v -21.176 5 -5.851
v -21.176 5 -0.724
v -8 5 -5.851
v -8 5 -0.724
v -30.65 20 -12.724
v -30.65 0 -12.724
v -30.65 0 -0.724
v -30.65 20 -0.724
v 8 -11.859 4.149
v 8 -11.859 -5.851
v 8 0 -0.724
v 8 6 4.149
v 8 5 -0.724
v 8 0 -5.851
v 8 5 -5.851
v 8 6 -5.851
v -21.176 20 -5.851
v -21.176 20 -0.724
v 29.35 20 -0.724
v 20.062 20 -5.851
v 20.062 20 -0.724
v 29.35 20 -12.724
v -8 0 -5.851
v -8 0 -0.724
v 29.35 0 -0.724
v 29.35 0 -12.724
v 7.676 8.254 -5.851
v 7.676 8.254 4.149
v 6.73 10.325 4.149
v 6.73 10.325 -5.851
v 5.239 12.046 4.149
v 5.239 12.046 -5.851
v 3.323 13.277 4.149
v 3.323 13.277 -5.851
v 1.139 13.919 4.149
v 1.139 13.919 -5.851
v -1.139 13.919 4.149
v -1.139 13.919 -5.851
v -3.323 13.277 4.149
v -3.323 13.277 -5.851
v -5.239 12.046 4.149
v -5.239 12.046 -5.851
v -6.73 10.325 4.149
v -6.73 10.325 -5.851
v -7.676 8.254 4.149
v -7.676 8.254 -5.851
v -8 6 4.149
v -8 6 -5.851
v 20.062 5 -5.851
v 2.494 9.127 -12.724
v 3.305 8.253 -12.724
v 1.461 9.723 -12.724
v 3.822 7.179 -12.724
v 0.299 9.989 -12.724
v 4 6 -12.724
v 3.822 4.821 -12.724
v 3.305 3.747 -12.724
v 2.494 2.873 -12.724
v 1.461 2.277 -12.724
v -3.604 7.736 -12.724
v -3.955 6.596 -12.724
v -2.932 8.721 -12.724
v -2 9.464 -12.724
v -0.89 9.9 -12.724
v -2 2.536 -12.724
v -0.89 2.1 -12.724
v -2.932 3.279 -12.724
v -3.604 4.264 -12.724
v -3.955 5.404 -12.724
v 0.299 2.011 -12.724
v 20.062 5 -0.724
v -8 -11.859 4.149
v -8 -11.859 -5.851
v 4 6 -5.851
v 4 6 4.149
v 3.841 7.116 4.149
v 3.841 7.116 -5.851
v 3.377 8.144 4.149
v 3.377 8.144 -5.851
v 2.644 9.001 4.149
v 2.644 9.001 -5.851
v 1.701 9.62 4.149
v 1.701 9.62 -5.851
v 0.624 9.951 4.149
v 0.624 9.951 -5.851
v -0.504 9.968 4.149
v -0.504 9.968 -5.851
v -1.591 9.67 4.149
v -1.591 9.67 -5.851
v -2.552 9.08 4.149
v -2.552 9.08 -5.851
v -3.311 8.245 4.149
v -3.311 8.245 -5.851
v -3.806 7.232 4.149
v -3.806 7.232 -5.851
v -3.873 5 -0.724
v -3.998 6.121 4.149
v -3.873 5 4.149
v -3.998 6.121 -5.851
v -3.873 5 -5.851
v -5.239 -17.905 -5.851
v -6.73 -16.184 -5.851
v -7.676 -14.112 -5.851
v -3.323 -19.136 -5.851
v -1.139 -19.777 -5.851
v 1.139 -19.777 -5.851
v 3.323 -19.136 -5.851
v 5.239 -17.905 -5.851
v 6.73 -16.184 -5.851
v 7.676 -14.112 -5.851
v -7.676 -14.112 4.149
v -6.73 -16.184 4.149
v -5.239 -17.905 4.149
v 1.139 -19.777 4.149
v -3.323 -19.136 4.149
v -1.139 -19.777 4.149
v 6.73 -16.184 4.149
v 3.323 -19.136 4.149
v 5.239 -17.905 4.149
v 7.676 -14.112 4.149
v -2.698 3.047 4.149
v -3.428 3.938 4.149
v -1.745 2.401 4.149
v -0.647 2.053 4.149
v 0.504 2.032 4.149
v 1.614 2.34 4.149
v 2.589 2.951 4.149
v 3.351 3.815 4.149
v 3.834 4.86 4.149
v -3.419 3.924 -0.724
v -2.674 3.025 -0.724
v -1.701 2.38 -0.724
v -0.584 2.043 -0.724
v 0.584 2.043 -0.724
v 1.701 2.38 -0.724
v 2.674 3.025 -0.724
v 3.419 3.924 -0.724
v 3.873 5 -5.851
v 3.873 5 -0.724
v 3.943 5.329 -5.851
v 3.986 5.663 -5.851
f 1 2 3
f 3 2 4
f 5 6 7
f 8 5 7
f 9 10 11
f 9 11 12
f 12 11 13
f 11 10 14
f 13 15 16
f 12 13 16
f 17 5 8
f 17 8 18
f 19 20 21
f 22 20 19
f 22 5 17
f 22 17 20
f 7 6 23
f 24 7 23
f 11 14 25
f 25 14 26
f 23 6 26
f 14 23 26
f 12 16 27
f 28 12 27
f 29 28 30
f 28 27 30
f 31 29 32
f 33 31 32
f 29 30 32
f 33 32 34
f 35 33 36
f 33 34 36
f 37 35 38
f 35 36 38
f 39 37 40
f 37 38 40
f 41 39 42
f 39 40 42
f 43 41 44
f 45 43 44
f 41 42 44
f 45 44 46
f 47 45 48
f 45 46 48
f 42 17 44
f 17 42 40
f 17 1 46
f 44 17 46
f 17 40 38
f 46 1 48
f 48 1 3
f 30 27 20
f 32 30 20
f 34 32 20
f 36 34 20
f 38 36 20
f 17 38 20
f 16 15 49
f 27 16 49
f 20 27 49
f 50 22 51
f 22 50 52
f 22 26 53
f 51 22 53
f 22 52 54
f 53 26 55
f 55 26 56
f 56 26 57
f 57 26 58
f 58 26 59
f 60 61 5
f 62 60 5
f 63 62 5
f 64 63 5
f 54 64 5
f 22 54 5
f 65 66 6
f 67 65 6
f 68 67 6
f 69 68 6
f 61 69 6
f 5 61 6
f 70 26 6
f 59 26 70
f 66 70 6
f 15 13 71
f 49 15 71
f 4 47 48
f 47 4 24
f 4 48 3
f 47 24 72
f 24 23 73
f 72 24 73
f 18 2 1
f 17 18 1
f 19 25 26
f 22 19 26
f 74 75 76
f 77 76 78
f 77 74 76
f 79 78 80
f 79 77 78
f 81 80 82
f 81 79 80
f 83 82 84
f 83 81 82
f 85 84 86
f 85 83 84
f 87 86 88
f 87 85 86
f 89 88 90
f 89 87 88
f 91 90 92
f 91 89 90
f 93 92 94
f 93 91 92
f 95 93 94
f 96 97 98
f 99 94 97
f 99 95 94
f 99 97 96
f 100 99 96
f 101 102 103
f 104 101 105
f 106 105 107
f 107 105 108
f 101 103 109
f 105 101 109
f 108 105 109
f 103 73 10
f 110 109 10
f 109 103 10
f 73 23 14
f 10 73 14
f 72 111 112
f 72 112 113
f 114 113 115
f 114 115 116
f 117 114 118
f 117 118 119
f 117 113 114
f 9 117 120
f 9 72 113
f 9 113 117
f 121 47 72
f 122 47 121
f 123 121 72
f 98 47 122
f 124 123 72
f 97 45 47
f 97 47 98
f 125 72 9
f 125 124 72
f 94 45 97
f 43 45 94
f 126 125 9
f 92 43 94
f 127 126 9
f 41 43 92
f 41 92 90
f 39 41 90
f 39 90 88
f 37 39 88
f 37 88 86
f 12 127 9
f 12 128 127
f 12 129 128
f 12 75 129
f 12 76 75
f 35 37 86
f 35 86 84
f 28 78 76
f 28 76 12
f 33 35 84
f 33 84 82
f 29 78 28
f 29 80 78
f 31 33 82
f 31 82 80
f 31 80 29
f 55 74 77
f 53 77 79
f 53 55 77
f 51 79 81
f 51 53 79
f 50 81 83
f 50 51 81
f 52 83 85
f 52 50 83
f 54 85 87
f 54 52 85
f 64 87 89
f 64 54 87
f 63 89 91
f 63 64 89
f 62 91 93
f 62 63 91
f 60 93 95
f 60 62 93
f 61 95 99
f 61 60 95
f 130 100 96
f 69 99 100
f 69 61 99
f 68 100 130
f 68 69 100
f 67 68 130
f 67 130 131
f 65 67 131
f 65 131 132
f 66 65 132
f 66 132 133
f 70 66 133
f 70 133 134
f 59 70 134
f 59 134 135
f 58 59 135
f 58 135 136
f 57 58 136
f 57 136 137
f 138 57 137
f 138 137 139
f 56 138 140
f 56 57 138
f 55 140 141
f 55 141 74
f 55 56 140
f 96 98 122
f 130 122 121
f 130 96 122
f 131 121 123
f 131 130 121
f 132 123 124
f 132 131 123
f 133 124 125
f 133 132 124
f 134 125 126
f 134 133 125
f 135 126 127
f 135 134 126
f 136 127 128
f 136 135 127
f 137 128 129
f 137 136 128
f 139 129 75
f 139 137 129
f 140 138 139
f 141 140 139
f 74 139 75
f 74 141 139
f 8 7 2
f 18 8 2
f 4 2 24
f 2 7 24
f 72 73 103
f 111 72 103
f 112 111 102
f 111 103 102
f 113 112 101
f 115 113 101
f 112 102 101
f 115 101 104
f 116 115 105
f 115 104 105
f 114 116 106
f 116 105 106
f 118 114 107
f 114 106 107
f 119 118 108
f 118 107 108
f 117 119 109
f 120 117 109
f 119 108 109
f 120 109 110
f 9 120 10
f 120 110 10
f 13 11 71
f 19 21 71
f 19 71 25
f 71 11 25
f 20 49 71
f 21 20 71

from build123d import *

# Parameters (mm, degrees)
BOSS_EXTRUDE1_DEPTH     = 20
SKETCH2_W               = 60
SKETCH2_H               = 12
BOSS_EXTRUDE2_DEPTH     = 5
SKETCH3_R               = 4
BOSS_EXTRUDE3_DEPTH     = 10
CUT_EXTRUDE1_DEPTH      = 38.939846984
CUT_EXTRUDE1_DEPTH_BACK = 38.939846984
SKETCH3_3_R             = 4


with BuildPart() as part:
    # Sketch1 → Boss-Extrude1 (new body)
    with BuildSketch(Plane(origin=(0, 0, 0), x_dir=(1, 0, 0), z_dir=(0, 1, 0))):
        Polygon((20.061919505, 0.724458204), (29.349845201, 0.724458204), (29.349845201, 12.724458204), (-30.650154799, 12.724458204), (-30.650154799, 0.724458204), (-21.176470588, 0.724458204), (-21.176470588, 5.851393189), (20.061919505, 5.851393189), align=None)
    extrude(amount=BOSS_EXTRUDE1_DEPTH)

    # Sketch2 → Boss-Extrude2 (add)
    with BuildSketch(Plane.XZ):
        with Locations((-0.650154799, -6.724458204)):
            Rectangle(SKETCH2_W, SKETCH2_H)
    extrude(amount=-BOSS_EXTRUDE2_DEPTH)

    # Sketch3 → Boss-Extrude3 (add)
    with BuildSketch(Plane.XY.offset(-5.851393189)):
        with BuildLine():
            Line((8, -11.858632677), (8, 6))
            ThreePointArc((8, 6), (0, 14), (-8, 6))
            Line((-8, 6), (-8, -11.858632677))
            ThreePointArc((-8, -11.858632677), (0, -19.858632677), (8, -11.858632677))
        make_face()
        with Locations((0, 6)):
            Circle(SKETCH3_R, mode=Mode.SUBTRACT)
    extrude(amount=BOSS_EXTRUDE3_DEPTH)

    # Sketch3<3> → Cut-Extrude1 (cut, two sides: drawn at the far end of the back side and taken through both)
    with BuildSketch(Plane.XY.offset(-5.851393189).offset(-CUT_EXTRUDE1_DEPTH_BACK)):
        with Locations((0, 6)):
            Circle(SKETCH3_3_R)
    extrude(amount=CUT_EXTRUDE1_DEPTH + CUT_EXTRUDE1_DEPTH_BACK, mode=Mode.SUBTRACT)


solid = part.part
